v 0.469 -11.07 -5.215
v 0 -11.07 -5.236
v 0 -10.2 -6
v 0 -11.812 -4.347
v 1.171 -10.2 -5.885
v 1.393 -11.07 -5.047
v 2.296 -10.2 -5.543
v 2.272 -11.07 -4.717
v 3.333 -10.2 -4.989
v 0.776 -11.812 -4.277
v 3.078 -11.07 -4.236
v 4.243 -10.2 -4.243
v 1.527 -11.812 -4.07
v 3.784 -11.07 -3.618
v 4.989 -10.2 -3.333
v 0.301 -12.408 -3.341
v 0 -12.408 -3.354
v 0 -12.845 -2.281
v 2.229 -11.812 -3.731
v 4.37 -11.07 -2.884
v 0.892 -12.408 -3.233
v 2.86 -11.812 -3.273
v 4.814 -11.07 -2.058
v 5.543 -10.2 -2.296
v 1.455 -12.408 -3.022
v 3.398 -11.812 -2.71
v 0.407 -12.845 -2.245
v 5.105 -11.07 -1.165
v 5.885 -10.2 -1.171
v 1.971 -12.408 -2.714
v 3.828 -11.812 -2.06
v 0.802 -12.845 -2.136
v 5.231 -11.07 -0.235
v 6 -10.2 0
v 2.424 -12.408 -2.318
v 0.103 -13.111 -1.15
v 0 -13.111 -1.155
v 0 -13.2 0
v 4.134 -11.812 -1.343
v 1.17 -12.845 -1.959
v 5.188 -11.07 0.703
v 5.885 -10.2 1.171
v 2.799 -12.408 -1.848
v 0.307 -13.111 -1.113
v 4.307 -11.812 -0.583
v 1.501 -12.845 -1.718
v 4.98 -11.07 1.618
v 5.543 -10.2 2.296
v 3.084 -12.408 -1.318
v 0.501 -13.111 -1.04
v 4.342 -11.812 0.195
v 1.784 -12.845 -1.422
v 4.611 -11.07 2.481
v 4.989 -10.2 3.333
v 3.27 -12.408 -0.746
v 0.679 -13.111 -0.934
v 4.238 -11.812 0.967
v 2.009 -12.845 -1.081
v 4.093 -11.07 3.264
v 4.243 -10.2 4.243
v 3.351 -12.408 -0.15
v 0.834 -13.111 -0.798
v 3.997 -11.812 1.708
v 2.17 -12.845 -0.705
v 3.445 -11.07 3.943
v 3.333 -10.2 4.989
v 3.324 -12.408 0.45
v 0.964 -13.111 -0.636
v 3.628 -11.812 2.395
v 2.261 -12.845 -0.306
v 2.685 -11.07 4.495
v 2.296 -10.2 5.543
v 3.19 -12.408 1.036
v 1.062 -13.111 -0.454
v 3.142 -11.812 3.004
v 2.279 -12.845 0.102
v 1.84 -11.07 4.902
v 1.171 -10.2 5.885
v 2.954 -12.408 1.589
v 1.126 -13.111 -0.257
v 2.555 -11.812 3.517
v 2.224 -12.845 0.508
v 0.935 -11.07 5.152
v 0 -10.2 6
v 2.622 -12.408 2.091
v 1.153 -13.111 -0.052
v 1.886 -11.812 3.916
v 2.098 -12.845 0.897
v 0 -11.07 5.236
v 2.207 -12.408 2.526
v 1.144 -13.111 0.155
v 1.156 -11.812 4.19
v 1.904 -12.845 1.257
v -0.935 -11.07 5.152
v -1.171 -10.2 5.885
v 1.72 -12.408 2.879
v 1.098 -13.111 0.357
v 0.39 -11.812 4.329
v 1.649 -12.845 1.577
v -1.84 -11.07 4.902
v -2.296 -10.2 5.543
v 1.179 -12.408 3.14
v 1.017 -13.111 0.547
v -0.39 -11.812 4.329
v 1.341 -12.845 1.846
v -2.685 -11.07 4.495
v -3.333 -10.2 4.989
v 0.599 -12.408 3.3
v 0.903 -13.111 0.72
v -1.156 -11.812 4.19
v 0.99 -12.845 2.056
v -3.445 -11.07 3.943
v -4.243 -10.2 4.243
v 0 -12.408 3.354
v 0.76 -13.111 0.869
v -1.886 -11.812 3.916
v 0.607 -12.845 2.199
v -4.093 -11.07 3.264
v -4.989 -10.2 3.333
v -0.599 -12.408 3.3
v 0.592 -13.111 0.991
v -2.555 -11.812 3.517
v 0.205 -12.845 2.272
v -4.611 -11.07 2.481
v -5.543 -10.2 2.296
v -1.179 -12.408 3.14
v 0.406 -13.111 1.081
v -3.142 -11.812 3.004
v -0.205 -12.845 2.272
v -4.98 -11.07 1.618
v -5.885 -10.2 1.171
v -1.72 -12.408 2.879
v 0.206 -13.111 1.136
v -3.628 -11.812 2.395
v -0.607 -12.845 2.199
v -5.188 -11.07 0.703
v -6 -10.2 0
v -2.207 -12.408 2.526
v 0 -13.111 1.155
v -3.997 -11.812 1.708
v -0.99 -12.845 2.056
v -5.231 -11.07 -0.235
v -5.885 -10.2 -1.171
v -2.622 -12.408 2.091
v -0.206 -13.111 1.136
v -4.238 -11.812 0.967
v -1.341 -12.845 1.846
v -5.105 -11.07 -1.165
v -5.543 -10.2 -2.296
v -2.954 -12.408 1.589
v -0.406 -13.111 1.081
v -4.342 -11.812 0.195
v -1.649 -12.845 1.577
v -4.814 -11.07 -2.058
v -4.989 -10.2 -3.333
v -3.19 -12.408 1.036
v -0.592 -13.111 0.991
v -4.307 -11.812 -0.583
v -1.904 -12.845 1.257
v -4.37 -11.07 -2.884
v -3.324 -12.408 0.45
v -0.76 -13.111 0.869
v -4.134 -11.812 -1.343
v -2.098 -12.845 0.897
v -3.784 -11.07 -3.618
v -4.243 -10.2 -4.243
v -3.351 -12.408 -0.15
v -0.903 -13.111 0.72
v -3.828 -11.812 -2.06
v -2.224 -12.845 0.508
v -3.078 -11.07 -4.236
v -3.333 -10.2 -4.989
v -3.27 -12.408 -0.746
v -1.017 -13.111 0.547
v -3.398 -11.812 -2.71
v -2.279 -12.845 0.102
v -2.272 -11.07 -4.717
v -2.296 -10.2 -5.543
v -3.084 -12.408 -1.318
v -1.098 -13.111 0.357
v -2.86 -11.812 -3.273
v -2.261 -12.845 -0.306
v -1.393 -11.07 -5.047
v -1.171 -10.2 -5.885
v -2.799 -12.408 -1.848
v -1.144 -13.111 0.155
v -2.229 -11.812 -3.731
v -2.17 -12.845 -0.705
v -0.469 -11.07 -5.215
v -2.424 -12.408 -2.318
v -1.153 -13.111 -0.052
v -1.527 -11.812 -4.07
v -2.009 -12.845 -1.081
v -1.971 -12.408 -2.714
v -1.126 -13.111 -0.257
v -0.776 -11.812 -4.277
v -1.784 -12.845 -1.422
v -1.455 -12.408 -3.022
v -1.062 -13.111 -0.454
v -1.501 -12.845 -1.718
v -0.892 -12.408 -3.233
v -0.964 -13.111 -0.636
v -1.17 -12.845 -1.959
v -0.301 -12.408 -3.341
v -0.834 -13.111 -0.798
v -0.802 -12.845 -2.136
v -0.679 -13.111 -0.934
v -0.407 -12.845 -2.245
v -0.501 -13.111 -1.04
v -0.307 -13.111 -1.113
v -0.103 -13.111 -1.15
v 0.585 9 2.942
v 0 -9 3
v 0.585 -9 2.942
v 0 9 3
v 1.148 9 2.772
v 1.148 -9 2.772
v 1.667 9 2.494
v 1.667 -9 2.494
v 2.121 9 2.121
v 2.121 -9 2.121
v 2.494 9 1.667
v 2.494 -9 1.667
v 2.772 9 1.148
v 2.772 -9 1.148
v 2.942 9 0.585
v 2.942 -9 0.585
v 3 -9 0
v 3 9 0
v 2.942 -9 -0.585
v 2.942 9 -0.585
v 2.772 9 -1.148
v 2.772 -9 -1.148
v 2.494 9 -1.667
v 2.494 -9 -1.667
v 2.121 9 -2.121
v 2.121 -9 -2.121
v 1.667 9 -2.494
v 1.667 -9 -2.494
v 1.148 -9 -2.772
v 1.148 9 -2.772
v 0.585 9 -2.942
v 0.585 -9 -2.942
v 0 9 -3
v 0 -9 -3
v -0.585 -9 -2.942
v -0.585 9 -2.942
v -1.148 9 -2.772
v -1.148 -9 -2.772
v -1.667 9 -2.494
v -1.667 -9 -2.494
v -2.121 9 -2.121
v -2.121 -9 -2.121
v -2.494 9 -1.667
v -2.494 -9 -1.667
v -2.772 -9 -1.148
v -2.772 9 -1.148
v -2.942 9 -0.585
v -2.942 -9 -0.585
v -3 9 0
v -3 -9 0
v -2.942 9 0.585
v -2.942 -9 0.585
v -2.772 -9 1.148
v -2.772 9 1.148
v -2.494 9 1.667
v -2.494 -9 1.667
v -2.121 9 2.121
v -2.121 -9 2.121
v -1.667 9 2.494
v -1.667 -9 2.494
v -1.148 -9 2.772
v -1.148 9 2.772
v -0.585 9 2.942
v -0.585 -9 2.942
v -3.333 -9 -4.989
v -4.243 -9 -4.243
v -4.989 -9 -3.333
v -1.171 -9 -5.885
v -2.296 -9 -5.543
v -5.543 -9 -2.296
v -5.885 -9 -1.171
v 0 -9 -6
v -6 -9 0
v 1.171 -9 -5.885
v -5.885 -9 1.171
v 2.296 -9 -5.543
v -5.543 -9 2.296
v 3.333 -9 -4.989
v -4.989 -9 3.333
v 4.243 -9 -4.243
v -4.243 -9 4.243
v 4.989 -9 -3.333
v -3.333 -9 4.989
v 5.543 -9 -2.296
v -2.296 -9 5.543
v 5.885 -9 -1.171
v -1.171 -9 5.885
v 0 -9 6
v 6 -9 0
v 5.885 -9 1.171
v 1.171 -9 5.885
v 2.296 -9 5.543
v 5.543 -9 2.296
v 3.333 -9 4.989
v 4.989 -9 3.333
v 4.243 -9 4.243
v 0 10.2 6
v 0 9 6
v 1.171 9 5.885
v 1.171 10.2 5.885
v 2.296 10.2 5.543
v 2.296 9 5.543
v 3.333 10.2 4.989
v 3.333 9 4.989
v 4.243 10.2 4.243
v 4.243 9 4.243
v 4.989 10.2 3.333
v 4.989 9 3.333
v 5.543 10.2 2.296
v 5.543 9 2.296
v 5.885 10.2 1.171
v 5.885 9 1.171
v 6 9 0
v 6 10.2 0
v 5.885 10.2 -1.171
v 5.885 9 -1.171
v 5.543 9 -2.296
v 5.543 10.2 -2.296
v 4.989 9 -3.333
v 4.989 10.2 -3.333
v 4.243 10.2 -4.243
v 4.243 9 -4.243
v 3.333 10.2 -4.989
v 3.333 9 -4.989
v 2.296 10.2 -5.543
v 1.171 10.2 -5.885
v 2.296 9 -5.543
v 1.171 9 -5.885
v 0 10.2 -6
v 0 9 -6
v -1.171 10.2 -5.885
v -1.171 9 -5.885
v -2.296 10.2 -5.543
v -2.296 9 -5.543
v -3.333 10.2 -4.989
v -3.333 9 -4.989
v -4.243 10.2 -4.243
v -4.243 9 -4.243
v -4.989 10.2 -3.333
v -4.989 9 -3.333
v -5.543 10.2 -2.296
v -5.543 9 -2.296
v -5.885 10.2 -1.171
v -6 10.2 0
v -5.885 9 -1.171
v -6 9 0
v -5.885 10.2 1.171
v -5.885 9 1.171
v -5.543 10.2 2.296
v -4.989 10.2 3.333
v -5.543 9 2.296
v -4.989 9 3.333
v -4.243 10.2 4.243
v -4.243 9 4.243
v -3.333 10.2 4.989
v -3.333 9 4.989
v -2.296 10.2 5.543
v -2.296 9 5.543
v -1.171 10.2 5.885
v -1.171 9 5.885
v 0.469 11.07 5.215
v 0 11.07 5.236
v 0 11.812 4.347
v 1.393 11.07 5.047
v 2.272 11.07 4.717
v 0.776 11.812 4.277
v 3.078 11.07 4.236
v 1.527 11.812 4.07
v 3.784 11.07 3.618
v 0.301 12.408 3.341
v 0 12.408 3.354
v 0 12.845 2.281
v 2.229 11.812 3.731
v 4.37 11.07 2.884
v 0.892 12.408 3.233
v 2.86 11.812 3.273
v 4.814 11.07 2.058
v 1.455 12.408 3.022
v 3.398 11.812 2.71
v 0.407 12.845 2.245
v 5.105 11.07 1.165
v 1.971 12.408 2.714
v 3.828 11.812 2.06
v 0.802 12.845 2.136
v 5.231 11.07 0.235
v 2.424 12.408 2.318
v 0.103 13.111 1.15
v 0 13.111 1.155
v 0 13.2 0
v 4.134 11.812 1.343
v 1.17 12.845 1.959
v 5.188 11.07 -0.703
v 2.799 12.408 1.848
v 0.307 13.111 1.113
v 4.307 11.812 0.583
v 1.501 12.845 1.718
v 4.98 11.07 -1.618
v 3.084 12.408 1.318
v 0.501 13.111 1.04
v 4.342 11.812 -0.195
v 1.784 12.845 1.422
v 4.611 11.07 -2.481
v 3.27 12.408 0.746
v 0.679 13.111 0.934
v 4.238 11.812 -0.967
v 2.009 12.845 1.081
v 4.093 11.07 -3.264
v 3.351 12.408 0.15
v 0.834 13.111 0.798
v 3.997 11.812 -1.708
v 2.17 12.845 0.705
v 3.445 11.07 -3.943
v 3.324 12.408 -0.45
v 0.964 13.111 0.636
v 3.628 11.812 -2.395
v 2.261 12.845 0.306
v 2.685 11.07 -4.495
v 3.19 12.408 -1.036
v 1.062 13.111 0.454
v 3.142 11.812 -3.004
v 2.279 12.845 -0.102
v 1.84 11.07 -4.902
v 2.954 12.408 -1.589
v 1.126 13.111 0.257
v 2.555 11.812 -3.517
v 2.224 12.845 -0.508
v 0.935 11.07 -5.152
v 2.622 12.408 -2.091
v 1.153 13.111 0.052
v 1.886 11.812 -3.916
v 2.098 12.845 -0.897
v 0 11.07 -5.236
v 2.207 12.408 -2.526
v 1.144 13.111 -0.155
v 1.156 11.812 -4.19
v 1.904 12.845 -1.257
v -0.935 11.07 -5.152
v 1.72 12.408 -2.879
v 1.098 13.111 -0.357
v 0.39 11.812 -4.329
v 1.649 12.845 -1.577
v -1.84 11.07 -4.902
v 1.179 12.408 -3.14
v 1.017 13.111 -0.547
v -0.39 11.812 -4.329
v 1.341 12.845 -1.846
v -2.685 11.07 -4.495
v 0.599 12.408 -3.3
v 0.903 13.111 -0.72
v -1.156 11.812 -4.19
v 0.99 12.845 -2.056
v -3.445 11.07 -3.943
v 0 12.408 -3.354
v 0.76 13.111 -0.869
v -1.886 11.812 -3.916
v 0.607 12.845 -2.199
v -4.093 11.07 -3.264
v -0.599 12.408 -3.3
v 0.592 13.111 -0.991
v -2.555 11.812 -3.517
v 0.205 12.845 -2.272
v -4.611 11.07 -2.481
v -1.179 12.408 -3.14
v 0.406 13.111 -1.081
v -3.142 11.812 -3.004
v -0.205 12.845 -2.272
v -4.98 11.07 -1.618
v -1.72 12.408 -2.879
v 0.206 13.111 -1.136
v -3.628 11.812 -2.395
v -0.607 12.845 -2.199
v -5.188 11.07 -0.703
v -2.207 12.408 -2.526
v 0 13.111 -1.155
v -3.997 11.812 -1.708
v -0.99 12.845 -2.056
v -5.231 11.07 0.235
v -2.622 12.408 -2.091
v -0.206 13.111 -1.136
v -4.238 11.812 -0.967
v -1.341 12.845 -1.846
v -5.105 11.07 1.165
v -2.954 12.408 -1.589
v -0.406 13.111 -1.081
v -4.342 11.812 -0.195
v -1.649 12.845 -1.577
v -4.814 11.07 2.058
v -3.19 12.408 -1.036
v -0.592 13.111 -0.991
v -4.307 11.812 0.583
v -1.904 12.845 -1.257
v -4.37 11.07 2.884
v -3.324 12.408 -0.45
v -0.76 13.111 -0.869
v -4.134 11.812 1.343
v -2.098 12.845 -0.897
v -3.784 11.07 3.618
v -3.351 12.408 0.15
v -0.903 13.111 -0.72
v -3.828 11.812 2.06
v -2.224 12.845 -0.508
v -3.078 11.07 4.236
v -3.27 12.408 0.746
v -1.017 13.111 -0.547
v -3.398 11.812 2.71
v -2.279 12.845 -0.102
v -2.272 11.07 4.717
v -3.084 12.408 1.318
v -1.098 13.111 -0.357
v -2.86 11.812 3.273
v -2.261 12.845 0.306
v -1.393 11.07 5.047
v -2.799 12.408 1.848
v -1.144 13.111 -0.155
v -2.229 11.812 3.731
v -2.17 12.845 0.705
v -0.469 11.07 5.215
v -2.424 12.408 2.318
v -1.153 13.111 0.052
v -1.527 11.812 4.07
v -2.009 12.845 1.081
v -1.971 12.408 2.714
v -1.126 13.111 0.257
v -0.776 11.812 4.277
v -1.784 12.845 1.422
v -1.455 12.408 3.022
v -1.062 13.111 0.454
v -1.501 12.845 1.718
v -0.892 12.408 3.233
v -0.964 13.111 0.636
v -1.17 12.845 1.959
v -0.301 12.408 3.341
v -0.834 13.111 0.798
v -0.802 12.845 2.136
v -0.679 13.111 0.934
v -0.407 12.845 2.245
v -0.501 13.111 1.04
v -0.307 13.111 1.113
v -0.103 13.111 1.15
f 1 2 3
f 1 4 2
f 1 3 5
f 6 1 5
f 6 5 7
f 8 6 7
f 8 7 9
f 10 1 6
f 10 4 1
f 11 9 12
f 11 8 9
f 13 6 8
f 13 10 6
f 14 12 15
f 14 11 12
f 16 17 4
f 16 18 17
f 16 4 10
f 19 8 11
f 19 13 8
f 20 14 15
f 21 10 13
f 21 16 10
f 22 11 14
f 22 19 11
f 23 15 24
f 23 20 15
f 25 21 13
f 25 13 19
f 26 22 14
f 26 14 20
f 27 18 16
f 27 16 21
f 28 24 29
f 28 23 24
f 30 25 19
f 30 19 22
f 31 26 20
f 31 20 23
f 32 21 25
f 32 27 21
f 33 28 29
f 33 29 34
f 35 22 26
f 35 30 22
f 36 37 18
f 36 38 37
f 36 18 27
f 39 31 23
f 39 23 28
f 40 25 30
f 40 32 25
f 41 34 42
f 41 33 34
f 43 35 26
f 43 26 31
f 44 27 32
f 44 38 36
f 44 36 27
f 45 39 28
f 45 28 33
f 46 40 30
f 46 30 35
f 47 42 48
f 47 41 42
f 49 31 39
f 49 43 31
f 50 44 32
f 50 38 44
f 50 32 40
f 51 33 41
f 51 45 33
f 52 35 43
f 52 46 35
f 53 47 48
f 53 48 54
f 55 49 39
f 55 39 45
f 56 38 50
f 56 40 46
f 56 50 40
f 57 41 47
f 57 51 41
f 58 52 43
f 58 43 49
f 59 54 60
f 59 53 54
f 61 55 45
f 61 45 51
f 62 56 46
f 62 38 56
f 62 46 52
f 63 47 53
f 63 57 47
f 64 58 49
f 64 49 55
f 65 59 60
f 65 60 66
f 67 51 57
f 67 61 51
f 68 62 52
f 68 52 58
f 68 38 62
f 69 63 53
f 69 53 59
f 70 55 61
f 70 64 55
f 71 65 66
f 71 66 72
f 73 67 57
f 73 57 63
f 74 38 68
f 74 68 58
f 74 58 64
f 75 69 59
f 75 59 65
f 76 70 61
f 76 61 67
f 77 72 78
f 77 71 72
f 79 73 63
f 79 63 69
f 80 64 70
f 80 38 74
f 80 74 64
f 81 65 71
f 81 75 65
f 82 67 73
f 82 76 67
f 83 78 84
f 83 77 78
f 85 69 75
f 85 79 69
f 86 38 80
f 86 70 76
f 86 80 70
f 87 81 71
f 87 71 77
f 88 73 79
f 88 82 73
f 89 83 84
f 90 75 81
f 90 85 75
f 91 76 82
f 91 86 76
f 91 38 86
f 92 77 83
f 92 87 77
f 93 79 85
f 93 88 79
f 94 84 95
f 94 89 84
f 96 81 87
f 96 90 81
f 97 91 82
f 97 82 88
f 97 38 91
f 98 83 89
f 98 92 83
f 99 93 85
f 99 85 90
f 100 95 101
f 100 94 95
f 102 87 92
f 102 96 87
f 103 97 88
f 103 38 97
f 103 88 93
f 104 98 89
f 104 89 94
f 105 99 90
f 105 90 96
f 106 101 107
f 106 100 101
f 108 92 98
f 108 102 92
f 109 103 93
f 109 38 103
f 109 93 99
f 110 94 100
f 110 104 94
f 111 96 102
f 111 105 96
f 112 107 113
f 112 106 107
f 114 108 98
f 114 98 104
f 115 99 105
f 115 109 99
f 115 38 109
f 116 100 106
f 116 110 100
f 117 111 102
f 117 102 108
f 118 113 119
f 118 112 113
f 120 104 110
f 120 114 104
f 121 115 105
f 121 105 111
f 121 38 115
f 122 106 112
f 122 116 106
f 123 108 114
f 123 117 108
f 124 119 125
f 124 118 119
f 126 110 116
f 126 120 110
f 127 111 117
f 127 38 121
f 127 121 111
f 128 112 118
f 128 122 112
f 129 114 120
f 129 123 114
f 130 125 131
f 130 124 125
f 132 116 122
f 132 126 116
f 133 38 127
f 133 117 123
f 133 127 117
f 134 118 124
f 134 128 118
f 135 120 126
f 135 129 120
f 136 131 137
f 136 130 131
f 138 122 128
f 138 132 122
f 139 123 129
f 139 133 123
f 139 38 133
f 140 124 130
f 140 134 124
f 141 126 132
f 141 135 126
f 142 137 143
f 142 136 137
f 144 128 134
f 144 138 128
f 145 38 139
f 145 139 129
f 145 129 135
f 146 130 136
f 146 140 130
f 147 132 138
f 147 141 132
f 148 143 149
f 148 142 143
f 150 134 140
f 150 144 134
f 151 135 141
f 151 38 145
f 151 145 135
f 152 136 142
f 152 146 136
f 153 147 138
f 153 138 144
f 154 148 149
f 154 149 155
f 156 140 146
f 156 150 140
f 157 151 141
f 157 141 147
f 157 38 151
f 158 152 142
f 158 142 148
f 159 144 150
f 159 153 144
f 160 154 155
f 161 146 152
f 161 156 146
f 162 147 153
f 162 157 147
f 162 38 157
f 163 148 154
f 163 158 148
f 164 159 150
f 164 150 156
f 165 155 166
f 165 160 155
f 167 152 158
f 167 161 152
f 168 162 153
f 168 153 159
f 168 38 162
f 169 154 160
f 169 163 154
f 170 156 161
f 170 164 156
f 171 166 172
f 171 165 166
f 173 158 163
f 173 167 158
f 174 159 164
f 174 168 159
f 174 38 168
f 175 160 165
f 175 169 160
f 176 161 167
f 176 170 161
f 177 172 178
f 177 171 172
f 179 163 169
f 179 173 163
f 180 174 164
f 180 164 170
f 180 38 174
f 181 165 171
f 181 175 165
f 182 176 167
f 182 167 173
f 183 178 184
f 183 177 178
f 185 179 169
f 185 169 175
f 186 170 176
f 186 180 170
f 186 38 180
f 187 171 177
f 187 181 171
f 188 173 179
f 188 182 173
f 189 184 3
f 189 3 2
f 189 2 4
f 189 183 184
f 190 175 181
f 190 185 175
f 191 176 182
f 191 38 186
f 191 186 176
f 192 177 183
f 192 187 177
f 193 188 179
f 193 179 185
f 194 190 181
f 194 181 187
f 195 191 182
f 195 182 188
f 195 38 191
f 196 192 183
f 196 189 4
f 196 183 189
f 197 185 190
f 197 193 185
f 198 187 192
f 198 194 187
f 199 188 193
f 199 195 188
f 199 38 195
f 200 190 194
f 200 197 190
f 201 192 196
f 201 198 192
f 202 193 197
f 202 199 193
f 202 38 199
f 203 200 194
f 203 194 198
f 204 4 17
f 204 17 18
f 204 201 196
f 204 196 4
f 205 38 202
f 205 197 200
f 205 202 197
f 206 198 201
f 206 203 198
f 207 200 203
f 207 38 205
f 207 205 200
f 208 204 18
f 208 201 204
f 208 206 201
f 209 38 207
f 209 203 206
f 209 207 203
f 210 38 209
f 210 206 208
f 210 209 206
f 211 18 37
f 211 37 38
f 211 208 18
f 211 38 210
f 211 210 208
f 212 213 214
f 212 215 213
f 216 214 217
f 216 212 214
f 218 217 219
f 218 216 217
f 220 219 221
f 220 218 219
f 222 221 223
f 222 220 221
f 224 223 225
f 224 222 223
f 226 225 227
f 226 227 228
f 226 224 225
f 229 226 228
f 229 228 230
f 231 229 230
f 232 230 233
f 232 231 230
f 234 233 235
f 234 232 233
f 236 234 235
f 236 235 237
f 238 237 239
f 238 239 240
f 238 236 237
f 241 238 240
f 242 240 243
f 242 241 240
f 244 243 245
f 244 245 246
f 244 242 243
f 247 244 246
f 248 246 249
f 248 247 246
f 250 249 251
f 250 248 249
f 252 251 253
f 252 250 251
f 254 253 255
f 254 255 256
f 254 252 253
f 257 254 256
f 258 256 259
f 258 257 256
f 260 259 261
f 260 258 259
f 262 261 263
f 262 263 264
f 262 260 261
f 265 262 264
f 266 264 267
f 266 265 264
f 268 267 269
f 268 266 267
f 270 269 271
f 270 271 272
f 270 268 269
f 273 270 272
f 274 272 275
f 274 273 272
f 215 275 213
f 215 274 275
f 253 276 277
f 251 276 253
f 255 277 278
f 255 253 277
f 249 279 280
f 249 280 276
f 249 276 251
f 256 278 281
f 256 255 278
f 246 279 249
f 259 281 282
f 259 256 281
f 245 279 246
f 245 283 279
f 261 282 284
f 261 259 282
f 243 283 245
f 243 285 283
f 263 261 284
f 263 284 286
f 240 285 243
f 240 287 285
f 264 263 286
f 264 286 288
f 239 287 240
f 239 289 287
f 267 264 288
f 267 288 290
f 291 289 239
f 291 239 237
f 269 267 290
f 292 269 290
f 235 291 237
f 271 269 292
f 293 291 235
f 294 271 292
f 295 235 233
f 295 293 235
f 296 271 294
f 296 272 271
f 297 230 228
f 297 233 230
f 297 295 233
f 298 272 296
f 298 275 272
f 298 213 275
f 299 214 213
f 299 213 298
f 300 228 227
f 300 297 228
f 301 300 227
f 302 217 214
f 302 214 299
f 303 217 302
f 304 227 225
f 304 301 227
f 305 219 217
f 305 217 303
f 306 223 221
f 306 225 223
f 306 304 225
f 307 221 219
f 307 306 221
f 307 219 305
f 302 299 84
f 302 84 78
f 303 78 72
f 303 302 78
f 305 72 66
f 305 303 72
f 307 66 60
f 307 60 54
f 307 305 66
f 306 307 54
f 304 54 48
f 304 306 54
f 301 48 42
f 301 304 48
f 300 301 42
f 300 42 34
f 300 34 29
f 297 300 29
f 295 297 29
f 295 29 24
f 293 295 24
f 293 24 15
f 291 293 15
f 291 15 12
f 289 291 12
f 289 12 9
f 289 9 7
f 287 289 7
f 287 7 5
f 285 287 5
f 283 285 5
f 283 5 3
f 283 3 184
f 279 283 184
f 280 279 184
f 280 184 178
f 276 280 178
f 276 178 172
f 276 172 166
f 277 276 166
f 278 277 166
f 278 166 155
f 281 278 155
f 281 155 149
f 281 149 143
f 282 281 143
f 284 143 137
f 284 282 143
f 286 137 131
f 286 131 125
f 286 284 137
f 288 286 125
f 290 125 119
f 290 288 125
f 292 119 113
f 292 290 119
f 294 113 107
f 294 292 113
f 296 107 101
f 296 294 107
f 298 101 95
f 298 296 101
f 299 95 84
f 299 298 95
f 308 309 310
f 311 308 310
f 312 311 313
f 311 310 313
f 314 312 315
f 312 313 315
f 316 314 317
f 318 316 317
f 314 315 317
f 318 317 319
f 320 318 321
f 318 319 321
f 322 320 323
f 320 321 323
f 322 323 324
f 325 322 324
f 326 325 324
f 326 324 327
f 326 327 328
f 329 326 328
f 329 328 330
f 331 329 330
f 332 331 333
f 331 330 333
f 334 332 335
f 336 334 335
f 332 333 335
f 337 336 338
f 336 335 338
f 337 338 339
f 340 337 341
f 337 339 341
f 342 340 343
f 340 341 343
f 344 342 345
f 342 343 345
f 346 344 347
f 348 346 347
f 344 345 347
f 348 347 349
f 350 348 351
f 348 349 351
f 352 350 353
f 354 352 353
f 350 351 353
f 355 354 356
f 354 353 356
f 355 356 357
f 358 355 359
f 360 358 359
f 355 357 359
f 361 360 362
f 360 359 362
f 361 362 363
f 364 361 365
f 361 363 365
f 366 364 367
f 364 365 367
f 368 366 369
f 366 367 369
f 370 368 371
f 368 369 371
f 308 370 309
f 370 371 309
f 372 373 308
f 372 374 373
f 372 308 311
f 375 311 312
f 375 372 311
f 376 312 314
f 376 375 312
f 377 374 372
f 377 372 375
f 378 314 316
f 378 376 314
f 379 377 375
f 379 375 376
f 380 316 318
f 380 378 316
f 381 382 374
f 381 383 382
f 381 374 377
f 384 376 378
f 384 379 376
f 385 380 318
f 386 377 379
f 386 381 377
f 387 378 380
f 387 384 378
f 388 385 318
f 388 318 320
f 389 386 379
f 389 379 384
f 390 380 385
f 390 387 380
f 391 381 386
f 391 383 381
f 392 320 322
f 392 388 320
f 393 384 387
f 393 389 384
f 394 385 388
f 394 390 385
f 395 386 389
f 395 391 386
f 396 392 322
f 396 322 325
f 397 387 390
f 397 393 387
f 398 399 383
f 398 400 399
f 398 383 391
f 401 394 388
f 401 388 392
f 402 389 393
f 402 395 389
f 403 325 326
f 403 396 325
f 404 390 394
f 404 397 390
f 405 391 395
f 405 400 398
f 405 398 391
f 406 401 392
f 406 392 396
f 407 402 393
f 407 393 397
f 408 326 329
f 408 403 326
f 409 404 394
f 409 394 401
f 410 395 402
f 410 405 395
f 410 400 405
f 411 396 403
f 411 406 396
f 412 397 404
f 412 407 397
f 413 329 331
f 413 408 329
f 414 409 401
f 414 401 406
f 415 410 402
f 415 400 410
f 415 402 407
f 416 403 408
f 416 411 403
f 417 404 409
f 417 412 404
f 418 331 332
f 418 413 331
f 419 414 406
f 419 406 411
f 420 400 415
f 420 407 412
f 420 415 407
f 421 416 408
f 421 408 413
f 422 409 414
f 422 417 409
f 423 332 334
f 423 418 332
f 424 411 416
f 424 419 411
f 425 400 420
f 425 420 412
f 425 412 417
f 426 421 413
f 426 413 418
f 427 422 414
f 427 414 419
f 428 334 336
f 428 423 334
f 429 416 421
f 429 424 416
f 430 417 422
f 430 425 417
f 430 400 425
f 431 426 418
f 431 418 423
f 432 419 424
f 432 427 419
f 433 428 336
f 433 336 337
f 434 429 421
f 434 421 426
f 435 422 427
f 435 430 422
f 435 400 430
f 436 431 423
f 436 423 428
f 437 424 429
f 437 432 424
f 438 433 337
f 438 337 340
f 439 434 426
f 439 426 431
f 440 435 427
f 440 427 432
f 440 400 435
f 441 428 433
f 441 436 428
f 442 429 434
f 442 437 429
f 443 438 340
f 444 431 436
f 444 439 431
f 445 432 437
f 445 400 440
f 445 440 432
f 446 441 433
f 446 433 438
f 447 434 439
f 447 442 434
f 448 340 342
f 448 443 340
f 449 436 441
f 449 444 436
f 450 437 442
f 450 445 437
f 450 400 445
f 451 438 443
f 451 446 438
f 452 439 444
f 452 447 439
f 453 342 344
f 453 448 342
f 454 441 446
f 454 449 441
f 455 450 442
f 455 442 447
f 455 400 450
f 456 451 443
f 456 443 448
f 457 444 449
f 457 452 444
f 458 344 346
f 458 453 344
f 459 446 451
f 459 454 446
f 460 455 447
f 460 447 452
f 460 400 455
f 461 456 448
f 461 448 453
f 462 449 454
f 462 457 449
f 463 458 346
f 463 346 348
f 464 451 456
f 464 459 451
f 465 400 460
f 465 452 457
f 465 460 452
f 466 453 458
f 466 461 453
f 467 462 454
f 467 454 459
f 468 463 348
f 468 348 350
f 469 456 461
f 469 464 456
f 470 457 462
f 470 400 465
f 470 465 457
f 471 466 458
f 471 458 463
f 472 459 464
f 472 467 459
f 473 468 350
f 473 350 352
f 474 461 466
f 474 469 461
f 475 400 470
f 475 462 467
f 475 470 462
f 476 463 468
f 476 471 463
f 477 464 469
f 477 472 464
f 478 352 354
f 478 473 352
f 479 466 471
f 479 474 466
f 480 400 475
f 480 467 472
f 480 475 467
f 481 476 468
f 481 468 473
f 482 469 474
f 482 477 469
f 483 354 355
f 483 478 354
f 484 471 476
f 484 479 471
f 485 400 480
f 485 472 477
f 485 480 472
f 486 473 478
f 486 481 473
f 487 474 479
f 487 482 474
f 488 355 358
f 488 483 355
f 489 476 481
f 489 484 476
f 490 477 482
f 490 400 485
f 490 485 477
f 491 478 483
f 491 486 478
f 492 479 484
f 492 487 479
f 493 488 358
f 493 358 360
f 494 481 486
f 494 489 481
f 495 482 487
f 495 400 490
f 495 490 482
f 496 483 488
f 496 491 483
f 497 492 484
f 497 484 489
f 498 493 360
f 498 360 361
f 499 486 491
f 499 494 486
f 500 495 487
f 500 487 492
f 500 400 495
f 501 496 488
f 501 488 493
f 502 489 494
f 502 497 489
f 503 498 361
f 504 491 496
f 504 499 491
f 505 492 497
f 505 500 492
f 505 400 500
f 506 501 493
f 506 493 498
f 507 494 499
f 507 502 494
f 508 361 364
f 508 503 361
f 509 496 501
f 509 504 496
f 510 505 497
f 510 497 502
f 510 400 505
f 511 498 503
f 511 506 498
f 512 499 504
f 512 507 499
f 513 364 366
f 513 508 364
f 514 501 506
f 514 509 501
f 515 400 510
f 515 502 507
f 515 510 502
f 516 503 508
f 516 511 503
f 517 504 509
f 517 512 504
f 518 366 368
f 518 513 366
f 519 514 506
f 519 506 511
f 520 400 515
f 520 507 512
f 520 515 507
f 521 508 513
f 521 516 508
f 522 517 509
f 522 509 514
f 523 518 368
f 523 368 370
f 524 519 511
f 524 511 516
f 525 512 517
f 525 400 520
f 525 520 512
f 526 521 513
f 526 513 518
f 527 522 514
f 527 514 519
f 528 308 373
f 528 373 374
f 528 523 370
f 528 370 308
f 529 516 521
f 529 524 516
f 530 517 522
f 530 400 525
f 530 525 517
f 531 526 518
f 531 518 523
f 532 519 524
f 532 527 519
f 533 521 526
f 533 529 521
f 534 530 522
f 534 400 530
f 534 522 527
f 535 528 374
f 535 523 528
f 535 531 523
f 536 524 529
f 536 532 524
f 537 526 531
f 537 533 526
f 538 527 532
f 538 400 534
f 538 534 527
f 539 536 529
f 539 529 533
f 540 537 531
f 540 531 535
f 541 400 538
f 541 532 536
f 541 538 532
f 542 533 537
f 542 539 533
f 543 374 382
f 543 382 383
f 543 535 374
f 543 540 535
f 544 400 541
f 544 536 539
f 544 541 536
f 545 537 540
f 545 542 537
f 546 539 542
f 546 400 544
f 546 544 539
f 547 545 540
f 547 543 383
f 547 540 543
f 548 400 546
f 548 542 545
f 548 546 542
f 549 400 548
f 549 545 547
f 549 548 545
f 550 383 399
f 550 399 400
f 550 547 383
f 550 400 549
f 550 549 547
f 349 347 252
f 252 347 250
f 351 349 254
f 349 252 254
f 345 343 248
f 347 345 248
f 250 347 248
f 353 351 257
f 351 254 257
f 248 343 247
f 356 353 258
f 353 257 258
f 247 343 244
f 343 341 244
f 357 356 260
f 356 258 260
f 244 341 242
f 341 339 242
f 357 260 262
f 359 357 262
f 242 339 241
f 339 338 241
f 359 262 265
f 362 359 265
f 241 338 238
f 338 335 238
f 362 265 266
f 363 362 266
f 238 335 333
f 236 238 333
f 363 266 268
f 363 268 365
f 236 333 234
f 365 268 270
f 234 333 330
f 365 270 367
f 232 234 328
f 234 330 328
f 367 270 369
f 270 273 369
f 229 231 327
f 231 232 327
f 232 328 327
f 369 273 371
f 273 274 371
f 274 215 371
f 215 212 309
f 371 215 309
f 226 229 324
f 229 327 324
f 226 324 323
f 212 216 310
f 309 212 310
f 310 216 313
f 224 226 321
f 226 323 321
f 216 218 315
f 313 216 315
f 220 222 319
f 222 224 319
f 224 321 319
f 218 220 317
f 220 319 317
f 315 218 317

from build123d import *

# Parameters (mm, degrees)
SKETCH_1_R                  = 3
EXTRUDE_1_DEPTH             = 9
SKETCH_2_R                  = 6
EXTRUDE_2_DEPTH             = 1.2
DOME_1_FACE_RADIUS          = 6
DOME_1_HEIGHT               = 3
MIRROR_1_COPY_1_FACE_RADIUS = 6
MIRROR_1_COPY_1_HEIGHT      = 3


with BuildPart() as part:
    # Эскиз1 → Бобышка-Вытянуть1 (new, symmetric)
    with BuildSketch(Plane(origin=(0, 0, 0), x_dir=(1, 0, 0), z_dir=(0, 1, 0))):
        with Locations(Location((0, 0, 0), (0, 0, 270))):
            Circle(SKETCH_1_R)
    extrude(amount=EXTRUDE_1_DEPTH, both=True)

    # Эскиз2 → Бобышка-Вытянуть2 (add)
    with BuildSketch(Plane(origin=(0, 9, 0), x_dir=(1, 0, 0), z_dir=(0, 1, 0))):
        with Locations(Location((0, 0, 0), (0, 0, 270))):
            Circle(SKETCH_2_R)
    extrude_2 = extrude(amount=EXTRUDE_2_DEPTH)

    # Купол1: a dome of height H over a round flat face of radius A is a cap of a sphere of radius (A * A + H * H) / (2 * H)
    dome_1_r = (DOME_1_FACE_RADIUS * DOME_1_FACE_RADIUS + DOME_1_HEIGHT * DOME_1_HEIGHT) / (2 * DOME_1_HEIGHT)
    dome_1_base = Plane((0, 10.2, 0), z_dir=(0, 1, 0))
    with Locations(dome_1_base.offset(DOME_1_HEIGHT - dome_1_r)):
        dome_1_ball = Sphere(dome_1_r, mode=Mode.PRIVATE)
    add(split(dome_1_ball, bisect_by=dome_1_base, keep=Keep.TOP, mode=Mode.PRIVATE))

    # Зеркальное отражение1: Бобышка-Вытянуть2 across plane
    add(extrude_2.mirror(Plane.ZX))

    # Зеркальное отражение1 copy 1: a dome of height H over a round flat face of radius A is a cap of a sphere of radius (A * A + H * H) / (2 * H)
    mirror_1_copy_1_r = (MIRROR_1_COPY_1_FACE_RADIUS * MIRROR_1_COPY_1_FACE_RADIUS + MIRROR_1_COPY_1_HEIGHT * MIRROR_1_COPY_1_HEIGHT) / (2 * MIRROR_1_COPY_1_HEIGHT)
    mirror_1_copy_1_base = Plane((0, -10.2, 0), z_dir=(0, -1, 0))
    with Locations(mirror_1_copy_1_base.offset(MIRROR_1_COPY_1_HEIGHT - mirror_1_copy_1_r)):
        mirror_1_copy_1_ball = Sphere(mirror_1_copy_1_r, mode=Mode.PRIVATE)
    add(split(mirror_1_copy_1_ball, bisect_by=mirror_1_copy_1_base, keep=Keep.TOP, mode=Mode.PRIVATE))


solid = part.part
